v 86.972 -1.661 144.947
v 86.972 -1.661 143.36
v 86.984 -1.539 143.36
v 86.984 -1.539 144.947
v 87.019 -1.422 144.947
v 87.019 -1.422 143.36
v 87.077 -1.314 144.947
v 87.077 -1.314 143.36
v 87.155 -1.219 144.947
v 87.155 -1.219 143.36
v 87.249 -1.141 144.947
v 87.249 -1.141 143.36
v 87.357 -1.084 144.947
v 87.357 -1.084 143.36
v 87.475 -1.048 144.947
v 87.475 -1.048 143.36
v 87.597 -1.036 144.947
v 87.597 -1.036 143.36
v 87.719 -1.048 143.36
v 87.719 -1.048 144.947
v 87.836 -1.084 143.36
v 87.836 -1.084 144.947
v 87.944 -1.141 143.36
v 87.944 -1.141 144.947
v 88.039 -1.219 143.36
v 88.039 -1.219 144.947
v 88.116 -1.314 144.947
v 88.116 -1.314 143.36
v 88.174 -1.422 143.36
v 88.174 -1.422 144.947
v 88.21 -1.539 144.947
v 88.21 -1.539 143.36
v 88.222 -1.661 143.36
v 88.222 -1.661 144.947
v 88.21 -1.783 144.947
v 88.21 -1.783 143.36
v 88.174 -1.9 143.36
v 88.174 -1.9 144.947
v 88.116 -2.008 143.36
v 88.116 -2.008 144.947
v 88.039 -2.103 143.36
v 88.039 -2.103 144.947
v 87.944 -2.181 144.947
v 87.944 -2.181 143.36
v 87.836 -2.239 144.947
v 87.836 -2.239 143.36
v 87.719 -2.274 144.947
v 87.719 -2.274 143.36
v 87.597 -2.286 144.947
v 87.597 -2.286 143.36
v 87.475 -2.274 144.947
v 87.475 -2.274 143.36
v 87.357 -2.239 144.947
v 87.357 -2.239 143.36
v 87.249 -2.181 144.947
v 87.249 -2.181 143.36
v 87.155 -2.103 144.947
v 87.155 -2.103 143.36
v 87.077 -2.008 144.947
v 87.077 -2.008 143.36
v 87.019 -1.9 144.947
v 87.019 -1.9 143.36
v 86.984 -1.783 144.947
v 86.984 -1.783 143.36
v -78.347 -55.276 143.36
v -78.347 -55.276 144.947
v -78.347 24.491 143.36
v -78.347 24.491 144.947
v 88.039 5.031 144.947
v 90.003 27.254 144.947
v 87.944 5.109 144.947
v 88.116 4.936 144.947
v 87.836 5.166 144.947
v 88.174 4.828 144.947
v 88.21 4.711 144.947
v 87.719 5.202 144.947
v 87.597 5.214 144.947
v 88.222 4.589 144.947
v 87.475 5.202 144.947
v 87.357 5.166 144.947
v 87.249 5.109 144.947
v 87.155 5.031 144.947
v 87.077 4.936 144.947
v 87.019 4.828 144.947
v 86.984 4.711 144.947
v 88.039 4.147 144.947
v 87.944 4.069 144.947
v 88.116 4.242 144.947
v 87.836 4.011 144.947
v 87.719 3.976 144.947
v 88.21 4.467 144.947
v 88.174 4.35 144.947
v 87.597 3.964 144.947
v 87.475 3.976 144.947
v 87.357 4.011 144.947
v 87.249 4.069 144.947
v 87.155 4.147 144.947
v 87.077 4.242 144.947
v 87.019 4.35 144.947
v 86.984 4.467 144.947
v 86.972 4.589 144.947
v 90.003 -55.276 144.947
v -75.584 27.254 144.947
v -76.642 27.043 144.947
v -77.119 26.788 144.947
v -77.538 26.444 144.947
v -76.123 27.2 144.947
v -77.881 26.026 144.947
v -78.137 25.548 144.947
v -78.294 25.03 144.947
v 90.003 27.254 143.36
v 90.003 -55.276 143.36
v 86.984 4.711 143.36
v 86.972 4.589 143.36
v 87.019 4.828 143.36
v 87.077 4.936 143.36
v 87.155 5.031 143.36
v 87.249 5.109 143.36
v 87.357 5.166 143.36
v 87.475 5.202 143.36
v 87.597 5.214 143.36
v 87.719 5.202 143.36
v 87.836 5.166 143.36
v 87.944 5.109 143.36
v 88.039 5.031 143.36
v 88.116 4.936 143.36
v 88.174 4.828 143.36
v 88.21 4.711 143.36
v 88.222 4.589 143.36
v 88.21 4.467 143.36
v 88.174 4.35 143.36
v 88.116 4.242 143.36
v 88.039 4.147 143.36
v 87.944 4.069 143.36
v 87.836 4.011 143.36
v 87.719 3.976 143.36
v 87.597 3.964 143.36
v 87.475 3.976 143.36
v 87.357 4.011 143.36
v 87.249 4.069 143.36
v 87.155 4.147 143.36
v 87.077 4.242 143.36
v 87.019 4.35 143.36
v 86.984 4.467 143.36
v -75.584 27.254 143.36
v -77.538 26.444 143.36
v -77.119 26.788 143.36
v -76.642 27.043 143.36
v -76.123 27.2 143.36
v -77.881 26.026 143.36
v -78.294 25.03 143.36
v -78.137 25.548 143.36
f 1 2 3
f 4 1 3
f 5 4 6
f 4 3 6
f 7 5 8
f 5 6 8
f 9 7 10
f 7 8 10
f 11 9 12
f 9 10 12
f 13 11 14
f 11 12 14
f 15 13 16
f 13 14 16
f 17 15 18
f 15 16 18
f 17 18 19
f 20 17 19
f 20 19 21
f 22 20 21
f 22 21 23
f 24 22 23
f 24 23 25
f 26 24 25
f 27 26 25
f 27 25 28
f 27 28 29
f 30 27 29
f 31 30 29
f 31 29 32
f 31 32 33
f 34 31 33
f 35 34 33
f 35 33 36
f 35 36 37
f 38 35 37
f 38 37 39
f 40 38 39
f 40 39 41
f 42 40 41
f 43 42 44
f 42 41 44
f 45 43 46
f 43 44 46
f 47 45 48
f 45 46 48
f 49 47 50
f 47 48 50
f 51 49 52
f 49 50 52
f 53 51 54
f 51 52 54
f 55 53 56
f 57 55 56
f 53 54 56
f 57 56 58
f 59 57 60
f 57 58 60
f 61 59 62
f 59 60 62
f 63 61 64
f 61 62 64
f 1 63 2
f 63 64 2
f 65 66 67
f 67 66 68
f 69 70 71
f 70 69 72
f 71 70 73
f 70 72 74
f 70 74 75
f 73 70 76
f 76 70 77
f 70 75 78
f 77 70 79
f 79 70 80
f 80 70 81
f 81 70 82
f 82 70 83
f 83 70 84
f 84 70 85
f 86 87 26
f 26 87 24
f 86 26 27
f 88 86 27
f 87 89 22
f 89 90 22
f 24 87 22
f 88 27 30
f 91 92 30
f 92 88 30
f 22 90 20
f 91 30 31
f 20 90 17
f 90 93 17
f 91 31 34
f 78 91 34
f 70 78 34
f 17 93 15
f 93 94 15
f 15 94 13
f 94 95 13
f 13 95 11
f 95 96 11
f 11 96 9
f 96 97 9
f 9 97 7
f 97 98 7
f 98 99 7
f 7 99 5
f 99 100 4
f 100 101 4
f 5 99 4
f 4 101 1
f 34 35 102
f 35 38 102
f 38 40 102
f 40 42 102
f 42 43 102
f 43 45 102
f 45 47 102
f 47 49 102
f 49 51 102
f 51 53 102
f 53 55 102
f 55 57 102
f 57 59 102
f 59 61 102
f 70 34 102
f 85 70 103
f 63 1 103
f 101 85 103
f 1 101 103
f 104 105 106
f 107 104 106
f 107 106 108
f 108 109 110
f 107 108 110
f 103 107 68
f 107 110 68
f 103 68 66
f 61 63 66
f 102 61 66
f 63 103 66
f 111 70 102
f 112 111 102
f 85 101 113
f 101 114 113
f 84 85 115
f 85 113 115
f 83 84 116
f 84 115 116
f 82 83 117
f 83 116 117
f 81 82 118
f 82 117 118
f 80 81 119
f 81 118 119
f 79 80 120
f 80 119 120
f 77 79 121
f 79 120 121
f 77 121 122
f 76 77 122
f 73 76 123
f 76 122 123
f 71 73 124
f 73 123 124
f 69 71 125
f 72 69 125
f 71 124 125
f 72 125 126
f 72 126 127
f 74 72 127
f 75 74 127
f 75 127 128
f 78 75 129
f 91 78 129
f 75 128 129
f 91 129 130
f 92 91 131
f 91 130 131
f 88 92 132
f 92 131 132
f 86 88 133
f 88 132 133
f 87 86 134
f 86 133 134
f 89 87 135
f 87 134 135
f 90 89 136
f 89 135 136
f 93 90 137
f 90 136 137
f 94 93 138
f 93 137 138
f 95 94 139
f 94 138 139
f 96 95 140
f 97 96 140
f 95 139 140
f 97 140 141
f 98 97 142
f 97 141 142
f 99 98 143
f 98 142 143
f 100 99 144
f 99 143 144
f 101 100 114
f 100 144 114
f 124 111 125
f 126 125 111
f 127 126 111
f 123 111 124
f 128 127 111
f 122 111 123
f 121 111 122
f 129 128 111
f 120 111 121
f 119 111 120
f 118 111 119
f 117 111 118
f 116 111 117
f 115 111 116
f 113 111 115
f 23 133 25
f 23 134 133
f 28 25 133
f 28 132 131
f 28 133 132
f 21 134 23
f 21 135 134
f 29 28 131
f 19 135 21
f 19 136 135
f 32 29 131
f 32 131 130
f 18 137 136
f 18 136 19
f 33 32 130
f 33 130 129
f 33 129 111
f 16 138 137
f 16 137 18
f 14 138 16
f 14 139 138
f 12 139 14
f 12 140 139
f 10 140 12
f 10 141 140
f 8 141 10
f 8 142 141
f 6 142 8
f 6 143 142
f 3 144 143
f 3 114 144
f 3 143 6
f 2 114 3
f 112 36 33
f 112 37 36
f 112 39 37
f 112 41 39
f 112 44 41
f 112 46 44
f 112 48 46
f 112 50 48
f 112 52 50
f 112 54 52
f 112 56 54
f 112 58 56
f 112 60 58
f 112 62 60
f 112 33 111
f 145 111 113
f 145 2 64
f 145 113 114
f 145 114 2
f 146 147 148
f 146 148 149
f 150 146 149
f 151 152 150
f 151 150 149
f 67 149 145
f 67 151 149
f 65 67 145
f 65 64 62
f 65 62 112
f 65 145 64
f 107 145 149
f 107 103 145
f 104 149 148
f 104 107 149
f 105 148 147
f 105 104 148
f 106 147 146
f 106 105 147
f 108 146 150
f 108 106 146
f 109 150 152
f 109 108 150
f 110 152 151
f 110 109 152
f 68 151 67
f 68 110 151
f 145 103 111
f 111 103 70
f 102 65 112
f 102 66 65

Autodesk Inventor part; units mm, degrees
ref_plane "YZ Plane" through (0, 0, 0) normal (1, 0, 0) x (0, 1, 0)
ref_plane "XZ Plane" through (0, 0, 0) normal (0, 1, 0) x (-1, 0, 0)
ref_plane "XY Plane" through (0, 0, 0) normal (0, 0, 1) x (1, 0, 0)
ref_plane "Work Plane1" through (98.003, 24.491, 144.9473) normal (0, -0.0001, -1) x (0, -1, 0.0001)
sketch "Sketch1" plane through (98.003, 24.491, 144.9473) normal (0, -0.0001, -1) x (0, -1, 0.0001)
  line L0 (3.4596, -1.4381) -> (98.1832, -4.2342) projected
  arc A0 (-4.7625, 4.7625) -> (3.4596, -1.4381) centre (0, 4.7625) ccw projected
  line L1 (3.4596, 0) -> (98.1832, 0) projected
  line L2 (94.7649, -4.2342) -> (94.7649, 8) projected
  line L3 (94.7649, 8) -> (81.7675, 8) projected
  line L4 (81.7675, 8) -> (81.7675, 170.35)
  line L5 (81.7675, 170.35) -> (94.7649, 170.35) projected
  line L6 (94.7649, 170.35) -> (94.7649, 178.35) projected
  arc A1 (0, 178.35) -> (-4.7625, 173.5875) centre (0, 173.5875) ccw
  line L7 (78.7675, 8) -> (0.2375, 8)
  line L8 (0.2375, 8) -> (-4.7625, 8)
  line L9 (78.7675, 8) -> (81.7675, 8)
  line L10 (81.7675, 170.35) -> (81.7675, 178.35)
  line L11 (0, 178.35) -> (81.7675, 178.35)
  line L12 (-4.7625, 8) -> (-4.7625, 173.5875)
  line L13 (-2.7625, 173.5875) -> (-2.7625, 10)
  line L14 (79.7675, 10) -> (79.7675, 170.35)
  line L15 (79.7675, 170.35) -> (79.7675, 176.35)
  line L16 (79.7675, 176.35) -> (0, 176.35)
  arc A2 (0, 176.35) -> (-2.7625, 173.5875) centre (0, 173.5875) ccw
  line L17 (-2.7625, 10) -> (-2.7625, 8)
  line L18 (79.7675, 10) -> (79.7675, 8)
  point P0 (24.483, 98.003)
  dimension "d2" = 2
extrude "Extrusion1" add sketch "Sketch1" along normal blind 1.5875 contours L9 L7 L8 L17 L13 A2 L16 L15 L14 L18
sketch "Sketch2" plane through (98.003, 24.4909, 143.3598) normal (0, -0.0001, -1) x (-1, 0, 0)
  circle A0 centre (10.4064, -19.902) radius 0.625
  circle A1 centre (10.4064, -26.152) radius 0.625
  point P0 (98.003, -24.483)
extrude "Extrusion2" cut sketch "Sketch2" against normal blind 1.5875
properties part number "acrylicDoor"
